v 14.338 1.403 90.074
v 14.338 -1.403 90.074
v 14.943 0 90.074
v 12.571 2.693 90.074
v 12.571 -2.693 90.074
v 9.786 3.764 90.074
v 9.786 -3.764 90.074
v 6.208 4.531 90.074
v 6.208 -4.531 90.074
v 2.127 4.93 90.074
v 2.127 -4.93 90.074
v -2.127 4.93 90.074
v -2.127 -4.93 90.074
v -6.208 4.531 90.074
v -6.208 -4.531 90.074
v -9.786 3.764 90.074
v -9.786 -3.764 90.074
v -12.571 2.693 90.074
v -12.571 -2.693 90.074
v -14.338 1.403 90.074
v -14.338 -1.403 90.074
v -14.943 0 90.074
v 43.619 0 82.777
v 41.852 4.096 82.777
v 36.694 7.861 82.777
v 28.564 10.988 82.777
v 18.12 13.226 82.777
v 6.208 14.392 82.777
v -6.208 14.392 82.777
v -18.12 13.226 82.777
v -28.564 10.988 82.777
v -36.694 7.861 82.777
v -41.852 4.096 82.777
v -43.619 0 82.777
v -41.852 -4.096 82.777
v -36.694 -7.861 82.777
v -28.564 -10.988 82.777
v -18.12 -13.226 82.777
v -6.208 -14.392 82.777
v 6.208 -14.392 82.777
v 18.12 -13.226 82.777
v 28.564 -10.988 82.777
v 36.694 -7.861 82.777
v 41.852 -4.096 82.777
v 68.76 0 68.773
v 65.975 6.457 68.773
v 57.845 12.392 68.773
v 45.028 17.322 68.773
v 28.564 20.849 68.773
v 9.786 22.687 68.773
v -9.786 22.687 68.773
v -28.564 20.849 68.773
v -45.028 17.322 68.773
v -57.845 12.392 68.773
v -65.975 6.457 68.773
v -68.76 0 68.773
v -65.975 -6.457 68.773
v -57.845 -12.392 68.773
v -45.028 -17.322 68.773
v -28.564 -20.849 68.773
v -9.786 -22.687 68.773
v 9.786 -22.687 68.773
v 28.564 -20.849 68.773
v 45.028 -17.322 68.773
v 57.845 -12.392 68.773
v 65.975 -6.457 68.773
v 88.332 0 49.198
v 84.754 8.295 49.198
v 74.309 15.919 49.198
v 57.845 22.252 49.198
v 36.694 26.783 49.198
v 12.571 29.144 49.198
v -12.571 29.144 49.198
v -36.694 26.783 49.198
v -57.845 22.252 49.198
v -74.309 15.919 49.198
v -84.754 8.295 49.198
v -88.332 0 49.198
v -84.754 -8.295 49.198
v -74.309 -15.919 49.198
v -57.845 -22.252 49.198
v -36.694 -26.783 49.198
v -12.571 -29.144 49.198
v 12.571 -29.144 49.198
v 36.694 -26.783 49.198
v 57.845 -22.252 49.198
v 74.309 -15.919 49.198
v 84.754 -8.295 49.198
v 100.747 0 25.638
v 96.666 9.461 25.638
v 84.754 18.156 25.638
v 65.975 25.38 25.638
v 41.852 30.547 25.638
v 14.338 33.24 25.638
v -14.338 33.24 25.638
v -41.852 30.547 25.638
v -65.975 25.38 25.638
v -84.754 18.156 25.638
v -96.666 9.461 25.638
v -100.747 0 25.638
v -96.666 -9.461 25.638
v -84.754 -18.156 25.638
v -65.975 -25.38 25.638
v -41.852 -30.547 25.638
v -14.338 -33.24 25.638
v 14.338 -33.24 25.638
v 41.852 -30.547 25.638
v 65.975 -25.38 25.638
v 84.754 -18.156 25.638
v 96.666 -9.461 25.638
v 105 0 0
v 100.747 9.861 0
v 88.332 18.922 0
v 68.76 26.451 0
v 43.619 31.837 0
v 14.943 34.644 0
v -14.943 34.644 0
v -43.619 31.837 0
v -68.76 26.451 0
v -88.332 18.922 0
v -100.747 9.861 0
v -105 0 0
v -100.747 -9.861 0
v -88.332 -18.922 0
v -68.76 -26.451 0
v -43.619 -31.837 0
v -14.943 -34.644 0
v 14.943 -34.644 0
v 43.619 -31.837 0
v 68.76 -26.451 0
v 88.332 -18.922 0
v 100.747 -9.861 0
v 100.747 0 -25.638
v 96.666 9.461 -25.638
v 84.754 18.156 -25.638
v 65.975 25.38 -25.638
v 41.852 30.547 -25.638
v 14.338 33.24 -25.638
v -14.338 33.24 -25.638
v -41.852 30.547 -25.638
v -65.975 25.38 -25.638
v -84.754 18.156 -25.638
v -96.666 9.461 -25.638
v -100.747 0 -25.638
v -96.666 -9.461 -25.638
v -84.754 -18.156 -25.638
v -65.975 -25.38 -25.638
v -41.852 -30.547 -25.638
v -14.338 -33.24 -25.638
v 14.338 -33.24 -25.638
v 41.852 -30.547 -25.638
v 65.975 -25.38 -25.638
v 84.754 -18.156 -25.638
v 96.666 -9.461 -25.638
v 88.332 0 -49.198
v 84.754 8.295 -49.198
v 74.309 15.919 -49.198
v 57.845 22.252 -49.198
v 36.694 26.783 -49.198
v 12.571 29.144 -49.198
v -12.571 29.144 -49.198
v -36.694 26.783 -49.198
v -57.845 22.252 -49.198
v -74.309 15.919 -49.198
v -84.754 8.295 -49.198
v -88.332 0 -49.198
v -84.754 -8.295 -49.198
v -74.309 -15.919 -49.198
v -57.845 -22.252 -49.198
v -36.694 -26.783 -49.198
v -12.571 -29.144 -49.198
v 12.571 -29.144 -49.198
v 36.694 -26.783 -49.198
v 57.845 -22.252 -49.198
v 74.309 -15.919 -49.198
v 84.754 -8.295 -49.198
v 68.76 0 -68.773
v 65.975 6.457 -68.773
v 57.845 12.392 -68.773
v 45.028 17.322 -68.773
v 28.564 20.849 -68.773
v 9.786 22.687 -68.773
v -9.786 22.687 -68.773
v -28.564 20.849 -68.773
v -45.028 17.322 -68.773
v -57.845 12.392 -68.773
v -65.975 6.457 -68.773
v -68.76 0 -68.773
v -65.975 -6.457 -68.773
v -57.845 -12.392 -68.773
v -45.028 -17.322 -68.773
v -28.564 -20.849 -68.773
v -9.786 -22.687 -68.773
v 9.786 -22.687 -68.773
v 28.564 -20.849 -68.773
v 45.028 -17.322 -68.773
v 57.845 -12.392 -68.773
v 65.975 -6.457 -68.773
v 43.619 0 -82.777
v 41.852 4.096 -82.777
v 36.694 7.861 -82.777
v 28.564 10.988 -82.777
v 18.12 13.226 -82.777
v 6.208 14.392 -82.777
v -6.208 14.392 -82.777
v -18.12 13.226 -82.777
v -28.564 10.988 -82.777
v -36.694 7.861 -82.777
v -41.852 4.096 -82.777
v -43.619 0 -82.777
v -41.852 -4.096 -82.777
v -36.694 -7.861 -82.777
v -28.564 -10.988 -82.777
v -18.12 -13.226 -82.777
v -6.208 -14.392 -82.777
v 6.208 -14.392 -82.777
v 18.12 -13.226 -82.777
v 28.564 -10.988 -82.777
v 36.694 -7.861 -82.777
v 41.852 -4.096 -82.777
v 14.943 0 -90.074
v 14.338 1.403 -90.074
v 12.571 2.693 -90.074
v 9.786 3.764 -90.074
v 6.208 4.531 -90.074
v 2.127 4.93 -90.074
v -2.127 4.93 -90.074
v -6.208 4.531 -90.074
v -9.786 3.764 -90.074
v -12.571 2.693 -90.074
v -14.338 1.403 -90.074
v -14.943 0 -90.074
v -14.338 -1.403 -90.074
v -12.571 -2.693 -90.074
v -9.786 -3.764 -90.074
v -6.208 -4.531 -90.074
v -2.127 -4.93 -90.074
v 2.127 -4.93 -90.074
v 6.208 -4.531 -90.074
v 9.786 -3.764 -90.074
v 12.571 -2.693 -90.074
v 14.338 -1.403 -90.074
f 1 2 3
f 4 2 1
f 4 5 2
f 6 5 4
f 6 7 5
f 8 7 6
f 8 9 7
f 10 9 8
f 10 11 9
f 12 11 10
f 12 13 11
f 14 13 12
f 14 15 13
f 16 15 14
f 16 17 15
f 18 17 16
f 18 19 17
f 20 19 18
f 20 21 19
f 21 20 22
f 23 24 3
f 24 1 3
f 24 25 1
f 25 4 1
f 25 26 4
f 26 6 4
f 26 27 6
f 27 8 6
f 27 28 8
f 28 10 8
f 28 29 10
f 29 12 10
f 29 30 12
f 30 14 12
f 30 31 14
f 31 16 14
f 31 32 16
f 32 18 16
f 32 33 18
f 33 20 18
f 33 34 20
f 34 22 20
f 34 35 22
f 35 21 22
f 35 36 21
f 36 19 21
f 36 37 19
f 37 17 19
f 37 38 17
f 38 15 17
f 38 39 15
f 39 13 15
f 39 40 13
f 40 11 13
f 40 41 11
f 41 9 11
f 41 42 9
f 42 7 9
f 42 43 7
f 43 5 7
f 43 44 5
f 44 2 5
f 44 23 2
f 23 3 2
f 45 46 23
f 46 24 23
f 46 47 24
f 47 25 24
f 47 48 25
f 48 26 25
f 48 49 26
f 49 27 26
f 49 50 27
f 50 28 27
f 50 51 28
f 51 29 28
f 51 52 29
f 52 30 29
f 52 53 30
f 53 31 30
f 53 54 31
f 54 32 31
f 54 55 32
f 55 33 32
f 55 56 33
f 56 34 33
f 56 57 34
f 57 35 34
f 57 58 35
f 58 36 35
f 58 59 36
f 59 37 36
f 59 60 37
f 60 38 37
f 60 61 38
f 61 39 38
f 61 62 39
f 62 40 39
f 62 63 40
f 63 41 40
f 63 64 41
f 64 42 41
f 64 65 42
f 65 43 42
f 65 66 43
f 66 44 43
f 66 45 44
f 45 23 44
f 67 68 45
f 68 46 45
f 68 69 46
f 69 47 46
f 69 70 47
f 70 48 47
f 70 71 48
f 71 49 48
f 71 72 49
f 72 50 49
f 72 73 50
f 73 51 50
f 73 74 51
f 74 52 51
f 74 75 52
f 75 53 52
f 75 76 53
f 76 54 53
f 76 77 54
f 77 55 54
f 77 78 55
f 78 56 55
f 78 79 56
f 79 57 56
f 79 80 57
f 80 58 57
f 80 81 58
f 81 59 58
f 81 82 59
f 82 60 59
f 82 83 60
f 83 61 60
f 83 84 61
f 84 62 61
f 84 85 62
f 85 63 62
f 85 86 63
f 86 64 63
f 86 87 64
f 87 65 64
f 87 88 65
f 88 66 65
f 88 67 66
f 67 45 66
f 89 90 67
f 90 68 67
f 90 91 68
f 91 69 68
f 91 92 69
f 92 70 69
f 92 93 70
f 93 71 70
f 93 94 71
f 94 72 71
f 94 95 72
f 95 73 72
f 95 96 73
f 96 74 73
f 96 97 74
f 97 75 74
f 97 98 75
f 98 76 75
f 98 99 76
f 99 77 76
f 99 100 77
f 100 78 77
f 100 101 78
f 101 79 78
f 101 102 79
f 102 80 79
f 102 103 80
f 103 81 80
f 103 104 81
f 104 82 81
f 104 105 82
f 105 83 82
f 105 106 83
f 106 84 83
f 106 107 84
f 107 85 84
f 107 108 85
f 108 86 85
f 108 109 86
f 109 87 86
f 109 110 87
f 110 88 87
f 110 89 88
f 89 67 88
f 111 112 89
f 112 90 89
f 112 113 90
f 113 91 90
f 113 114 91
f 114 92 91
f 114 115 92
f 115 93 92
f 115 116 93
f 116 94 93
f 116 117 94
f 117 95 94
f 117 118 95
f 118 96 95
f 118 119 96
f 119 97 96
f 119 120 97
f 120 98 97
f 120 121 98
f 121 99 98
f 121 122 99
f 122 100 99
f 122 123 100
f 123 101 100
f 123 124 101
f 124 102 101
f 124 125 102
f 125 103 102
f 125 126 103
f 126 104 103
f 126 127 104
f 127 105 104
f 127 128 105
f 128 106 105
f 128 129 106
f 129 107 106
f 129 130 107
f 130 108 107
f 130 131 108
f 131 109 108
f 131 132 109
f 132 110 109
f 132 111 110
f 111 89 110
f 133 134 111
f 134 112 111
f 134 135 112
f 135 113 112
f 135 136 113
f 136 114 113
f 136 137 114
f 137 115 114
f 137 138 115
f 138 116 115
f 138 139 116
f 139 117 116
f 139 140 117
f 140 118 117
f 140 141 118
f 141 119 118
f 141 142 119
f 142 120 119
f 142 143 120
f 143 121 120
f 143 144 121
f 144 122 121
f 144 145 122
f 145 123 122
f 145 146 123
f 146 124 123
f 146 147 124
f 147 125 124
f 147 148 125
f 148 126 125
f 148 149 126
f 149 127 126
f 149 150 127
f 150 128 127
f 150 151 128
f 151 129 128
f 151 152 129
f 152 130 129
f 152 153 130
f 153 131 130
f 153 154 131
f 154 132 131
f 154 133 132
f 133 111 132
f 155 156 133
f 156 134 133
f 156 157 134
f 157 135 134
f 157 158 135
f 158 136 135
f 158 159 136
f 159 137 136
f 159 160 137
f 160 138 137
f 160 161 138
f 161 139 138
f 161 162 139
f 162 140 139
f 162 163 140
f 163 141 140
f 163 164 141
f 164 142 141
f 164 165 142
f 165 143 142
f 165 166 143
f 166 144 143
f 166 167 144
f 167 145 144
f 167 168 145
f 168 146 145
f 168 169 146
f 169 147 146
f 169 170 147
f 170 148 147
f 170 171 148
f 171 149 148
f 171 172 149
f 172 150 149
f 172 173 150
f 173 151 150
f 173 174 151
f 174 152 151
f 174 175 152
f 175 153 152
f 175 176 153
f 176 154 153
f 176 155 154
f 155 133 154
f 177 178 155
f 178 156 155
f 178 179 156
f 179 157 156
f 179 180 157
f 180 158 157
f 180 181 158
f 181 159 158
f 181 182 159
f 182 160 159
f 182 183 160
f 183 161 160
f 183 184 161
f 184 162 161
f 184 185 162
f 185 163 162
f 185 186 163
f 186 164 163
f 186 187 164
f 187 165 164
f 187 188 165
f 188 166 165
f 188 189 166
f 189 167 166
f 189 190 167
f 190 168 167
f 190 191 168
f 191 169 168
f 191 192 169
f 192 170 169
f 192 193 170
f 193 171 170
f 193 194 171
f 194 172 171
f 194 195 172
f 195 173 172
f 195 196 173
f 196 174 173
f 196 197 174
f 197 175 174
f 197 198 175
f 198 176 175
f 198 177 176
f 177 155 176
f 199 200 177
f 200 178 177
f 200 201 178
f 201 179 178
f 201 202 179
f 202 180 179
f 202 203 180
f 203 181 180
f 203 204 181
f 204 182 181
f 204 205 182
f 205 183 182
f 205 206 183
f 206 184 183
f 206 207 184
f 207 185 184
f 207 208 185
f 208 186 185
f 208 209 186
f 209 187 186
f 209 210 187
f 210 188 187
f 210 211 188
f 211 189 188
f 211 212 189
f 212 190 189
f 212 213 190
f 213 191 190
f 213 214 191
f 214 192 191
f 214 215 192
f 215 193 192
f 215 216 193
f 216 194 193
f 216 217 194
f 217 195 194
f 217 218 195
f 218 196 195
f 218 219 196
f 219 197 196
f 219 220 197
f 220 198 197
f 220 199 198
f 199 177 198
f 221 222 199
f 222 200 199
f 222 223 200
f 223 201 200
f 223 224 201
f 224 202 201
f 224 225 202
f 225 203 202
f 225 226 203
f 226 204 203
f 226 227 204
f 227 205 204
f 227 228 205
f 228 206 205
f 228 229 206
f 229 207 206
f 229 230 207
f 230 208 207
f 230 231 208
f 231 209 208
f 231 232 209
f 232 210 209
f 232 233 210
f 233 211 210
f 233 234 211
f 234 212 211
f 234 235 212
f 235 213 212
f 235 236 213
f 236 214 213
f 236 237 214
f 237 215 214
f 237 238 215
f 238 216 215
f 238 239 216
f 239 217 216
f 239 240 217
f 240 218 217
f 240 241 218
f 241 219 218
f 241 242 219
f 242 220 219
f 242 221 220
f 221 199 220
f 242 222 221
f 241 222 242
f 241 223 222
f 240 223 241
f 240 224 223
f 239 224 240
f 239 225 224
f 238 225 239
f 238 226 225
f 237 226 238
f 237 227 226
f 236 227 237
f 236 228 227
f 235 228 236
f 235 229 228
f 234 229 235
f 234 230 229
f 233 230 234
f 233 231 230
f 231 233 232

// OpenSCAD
// Generated by SolidPython 1.0.1 on 2020-07-29 00:46:51


scale(v = [15, 5, 13]) {
	sphere(r = 7);
}
/***********************************************
*********      SolidPython code:      **********
************************************************
 
# import packages: SolidPython
from solid import *
from solid.utils import *
from itertools import chain, combinations, permutations


class Resize:

    def __init__(self, scad_file):
        self.scad_file = scad_file
        #self.scad_file = import_scad(scad_file)
        # cone/cylinder param:
        self.r1 = 0
        self.r2 = 0
        self.h = 0
        # rectangular prism param:
        self.w = 0
        self.l = 0
        # ellipse param:
        self.r = 0

    # import OpenScad code (file name corresponds to shape)


    # classify shape + parameters
    def assign(self, param1, param2, param3):
        if self.scad_file == 'cone.scad':
            self.r1 = param1
            self.r2 = param2
            self.h = param3
        elif self.scad_file == 'cylinder.scad':
            self.r1 = param1
            self.r2 = param2
            self.h = param3
        elif self.scad_file == 'rectangularPrism.scad':
            self.h = param1
            self.l = param2
            self.w = param3
        else:
            self.r = param1
            self.h = param2

    # resize parameters
    def iterate(self):
        x = range(3, 20, 2)
        i = 1
        if self.scad_file == 'cone.scad':
            tempList = list(permutations(x, 2))
            for temp in tempList:
                param1 = temp[0]
                param2 = temp[1]
                filepath = 'produced_scad_files/' + 'cone' + str(param1) + '_' + str(param2) + '_' + '.scad'
                scad_render_to_file(cylinder(h=param1, r1=param2, r2=0), filepath)

        elif self.scad_file == 'cylinder.scad':
            tempList = list(permutations(x, 3))
            for temp in tempList:
                param1 = temp[0]
                param2 = temp[1]
                filepath = 'produced_scad_files/' + 'cylinder' + str(param1) + '_' + str(param2) + '_' + '.scad'
                scad_render_to_file(cylinder(h=param1, r1=param2, r2=param2), filepath)

        elif self.scad_file == 'rectangularPrism.scad':
            tempList = list(permutations(x, 3))
            for temp in tempList:
                param1 = temp[0]
                param2 = temp[1]
                param3 = temp[2]
                filepath = 'produced_scad_files/' + 'rectangularPrism' + str(param1) + '_' + str(param2) + '_' + str(
                    param3) + '.scad'
                scad_render_to_file(cube(size=(param1, param2, param3)), filepath)

        elif self.scad_file == 'ellipse.scad':
            tempList = list(permutations(x, 4))
            for temp in tempList:
                param1 = temp[0]
                param2 = temp[1]
                param3 = temp[2]
                param4 = temp[3]
                filepath = 'produced_scad_files/' + 'ellipse' + str(param1) + '_' + str(param2) + '_' + str(param3) + '_' + str(param4) + '.scad'
                scad_render_to_file(scale([param1, param2, param3])(sphere(r=param4)), filepath)

    def render_to_scadfile(self):
        scad_render_to_file(scad, 'example.scad') 
 
************************************************/
